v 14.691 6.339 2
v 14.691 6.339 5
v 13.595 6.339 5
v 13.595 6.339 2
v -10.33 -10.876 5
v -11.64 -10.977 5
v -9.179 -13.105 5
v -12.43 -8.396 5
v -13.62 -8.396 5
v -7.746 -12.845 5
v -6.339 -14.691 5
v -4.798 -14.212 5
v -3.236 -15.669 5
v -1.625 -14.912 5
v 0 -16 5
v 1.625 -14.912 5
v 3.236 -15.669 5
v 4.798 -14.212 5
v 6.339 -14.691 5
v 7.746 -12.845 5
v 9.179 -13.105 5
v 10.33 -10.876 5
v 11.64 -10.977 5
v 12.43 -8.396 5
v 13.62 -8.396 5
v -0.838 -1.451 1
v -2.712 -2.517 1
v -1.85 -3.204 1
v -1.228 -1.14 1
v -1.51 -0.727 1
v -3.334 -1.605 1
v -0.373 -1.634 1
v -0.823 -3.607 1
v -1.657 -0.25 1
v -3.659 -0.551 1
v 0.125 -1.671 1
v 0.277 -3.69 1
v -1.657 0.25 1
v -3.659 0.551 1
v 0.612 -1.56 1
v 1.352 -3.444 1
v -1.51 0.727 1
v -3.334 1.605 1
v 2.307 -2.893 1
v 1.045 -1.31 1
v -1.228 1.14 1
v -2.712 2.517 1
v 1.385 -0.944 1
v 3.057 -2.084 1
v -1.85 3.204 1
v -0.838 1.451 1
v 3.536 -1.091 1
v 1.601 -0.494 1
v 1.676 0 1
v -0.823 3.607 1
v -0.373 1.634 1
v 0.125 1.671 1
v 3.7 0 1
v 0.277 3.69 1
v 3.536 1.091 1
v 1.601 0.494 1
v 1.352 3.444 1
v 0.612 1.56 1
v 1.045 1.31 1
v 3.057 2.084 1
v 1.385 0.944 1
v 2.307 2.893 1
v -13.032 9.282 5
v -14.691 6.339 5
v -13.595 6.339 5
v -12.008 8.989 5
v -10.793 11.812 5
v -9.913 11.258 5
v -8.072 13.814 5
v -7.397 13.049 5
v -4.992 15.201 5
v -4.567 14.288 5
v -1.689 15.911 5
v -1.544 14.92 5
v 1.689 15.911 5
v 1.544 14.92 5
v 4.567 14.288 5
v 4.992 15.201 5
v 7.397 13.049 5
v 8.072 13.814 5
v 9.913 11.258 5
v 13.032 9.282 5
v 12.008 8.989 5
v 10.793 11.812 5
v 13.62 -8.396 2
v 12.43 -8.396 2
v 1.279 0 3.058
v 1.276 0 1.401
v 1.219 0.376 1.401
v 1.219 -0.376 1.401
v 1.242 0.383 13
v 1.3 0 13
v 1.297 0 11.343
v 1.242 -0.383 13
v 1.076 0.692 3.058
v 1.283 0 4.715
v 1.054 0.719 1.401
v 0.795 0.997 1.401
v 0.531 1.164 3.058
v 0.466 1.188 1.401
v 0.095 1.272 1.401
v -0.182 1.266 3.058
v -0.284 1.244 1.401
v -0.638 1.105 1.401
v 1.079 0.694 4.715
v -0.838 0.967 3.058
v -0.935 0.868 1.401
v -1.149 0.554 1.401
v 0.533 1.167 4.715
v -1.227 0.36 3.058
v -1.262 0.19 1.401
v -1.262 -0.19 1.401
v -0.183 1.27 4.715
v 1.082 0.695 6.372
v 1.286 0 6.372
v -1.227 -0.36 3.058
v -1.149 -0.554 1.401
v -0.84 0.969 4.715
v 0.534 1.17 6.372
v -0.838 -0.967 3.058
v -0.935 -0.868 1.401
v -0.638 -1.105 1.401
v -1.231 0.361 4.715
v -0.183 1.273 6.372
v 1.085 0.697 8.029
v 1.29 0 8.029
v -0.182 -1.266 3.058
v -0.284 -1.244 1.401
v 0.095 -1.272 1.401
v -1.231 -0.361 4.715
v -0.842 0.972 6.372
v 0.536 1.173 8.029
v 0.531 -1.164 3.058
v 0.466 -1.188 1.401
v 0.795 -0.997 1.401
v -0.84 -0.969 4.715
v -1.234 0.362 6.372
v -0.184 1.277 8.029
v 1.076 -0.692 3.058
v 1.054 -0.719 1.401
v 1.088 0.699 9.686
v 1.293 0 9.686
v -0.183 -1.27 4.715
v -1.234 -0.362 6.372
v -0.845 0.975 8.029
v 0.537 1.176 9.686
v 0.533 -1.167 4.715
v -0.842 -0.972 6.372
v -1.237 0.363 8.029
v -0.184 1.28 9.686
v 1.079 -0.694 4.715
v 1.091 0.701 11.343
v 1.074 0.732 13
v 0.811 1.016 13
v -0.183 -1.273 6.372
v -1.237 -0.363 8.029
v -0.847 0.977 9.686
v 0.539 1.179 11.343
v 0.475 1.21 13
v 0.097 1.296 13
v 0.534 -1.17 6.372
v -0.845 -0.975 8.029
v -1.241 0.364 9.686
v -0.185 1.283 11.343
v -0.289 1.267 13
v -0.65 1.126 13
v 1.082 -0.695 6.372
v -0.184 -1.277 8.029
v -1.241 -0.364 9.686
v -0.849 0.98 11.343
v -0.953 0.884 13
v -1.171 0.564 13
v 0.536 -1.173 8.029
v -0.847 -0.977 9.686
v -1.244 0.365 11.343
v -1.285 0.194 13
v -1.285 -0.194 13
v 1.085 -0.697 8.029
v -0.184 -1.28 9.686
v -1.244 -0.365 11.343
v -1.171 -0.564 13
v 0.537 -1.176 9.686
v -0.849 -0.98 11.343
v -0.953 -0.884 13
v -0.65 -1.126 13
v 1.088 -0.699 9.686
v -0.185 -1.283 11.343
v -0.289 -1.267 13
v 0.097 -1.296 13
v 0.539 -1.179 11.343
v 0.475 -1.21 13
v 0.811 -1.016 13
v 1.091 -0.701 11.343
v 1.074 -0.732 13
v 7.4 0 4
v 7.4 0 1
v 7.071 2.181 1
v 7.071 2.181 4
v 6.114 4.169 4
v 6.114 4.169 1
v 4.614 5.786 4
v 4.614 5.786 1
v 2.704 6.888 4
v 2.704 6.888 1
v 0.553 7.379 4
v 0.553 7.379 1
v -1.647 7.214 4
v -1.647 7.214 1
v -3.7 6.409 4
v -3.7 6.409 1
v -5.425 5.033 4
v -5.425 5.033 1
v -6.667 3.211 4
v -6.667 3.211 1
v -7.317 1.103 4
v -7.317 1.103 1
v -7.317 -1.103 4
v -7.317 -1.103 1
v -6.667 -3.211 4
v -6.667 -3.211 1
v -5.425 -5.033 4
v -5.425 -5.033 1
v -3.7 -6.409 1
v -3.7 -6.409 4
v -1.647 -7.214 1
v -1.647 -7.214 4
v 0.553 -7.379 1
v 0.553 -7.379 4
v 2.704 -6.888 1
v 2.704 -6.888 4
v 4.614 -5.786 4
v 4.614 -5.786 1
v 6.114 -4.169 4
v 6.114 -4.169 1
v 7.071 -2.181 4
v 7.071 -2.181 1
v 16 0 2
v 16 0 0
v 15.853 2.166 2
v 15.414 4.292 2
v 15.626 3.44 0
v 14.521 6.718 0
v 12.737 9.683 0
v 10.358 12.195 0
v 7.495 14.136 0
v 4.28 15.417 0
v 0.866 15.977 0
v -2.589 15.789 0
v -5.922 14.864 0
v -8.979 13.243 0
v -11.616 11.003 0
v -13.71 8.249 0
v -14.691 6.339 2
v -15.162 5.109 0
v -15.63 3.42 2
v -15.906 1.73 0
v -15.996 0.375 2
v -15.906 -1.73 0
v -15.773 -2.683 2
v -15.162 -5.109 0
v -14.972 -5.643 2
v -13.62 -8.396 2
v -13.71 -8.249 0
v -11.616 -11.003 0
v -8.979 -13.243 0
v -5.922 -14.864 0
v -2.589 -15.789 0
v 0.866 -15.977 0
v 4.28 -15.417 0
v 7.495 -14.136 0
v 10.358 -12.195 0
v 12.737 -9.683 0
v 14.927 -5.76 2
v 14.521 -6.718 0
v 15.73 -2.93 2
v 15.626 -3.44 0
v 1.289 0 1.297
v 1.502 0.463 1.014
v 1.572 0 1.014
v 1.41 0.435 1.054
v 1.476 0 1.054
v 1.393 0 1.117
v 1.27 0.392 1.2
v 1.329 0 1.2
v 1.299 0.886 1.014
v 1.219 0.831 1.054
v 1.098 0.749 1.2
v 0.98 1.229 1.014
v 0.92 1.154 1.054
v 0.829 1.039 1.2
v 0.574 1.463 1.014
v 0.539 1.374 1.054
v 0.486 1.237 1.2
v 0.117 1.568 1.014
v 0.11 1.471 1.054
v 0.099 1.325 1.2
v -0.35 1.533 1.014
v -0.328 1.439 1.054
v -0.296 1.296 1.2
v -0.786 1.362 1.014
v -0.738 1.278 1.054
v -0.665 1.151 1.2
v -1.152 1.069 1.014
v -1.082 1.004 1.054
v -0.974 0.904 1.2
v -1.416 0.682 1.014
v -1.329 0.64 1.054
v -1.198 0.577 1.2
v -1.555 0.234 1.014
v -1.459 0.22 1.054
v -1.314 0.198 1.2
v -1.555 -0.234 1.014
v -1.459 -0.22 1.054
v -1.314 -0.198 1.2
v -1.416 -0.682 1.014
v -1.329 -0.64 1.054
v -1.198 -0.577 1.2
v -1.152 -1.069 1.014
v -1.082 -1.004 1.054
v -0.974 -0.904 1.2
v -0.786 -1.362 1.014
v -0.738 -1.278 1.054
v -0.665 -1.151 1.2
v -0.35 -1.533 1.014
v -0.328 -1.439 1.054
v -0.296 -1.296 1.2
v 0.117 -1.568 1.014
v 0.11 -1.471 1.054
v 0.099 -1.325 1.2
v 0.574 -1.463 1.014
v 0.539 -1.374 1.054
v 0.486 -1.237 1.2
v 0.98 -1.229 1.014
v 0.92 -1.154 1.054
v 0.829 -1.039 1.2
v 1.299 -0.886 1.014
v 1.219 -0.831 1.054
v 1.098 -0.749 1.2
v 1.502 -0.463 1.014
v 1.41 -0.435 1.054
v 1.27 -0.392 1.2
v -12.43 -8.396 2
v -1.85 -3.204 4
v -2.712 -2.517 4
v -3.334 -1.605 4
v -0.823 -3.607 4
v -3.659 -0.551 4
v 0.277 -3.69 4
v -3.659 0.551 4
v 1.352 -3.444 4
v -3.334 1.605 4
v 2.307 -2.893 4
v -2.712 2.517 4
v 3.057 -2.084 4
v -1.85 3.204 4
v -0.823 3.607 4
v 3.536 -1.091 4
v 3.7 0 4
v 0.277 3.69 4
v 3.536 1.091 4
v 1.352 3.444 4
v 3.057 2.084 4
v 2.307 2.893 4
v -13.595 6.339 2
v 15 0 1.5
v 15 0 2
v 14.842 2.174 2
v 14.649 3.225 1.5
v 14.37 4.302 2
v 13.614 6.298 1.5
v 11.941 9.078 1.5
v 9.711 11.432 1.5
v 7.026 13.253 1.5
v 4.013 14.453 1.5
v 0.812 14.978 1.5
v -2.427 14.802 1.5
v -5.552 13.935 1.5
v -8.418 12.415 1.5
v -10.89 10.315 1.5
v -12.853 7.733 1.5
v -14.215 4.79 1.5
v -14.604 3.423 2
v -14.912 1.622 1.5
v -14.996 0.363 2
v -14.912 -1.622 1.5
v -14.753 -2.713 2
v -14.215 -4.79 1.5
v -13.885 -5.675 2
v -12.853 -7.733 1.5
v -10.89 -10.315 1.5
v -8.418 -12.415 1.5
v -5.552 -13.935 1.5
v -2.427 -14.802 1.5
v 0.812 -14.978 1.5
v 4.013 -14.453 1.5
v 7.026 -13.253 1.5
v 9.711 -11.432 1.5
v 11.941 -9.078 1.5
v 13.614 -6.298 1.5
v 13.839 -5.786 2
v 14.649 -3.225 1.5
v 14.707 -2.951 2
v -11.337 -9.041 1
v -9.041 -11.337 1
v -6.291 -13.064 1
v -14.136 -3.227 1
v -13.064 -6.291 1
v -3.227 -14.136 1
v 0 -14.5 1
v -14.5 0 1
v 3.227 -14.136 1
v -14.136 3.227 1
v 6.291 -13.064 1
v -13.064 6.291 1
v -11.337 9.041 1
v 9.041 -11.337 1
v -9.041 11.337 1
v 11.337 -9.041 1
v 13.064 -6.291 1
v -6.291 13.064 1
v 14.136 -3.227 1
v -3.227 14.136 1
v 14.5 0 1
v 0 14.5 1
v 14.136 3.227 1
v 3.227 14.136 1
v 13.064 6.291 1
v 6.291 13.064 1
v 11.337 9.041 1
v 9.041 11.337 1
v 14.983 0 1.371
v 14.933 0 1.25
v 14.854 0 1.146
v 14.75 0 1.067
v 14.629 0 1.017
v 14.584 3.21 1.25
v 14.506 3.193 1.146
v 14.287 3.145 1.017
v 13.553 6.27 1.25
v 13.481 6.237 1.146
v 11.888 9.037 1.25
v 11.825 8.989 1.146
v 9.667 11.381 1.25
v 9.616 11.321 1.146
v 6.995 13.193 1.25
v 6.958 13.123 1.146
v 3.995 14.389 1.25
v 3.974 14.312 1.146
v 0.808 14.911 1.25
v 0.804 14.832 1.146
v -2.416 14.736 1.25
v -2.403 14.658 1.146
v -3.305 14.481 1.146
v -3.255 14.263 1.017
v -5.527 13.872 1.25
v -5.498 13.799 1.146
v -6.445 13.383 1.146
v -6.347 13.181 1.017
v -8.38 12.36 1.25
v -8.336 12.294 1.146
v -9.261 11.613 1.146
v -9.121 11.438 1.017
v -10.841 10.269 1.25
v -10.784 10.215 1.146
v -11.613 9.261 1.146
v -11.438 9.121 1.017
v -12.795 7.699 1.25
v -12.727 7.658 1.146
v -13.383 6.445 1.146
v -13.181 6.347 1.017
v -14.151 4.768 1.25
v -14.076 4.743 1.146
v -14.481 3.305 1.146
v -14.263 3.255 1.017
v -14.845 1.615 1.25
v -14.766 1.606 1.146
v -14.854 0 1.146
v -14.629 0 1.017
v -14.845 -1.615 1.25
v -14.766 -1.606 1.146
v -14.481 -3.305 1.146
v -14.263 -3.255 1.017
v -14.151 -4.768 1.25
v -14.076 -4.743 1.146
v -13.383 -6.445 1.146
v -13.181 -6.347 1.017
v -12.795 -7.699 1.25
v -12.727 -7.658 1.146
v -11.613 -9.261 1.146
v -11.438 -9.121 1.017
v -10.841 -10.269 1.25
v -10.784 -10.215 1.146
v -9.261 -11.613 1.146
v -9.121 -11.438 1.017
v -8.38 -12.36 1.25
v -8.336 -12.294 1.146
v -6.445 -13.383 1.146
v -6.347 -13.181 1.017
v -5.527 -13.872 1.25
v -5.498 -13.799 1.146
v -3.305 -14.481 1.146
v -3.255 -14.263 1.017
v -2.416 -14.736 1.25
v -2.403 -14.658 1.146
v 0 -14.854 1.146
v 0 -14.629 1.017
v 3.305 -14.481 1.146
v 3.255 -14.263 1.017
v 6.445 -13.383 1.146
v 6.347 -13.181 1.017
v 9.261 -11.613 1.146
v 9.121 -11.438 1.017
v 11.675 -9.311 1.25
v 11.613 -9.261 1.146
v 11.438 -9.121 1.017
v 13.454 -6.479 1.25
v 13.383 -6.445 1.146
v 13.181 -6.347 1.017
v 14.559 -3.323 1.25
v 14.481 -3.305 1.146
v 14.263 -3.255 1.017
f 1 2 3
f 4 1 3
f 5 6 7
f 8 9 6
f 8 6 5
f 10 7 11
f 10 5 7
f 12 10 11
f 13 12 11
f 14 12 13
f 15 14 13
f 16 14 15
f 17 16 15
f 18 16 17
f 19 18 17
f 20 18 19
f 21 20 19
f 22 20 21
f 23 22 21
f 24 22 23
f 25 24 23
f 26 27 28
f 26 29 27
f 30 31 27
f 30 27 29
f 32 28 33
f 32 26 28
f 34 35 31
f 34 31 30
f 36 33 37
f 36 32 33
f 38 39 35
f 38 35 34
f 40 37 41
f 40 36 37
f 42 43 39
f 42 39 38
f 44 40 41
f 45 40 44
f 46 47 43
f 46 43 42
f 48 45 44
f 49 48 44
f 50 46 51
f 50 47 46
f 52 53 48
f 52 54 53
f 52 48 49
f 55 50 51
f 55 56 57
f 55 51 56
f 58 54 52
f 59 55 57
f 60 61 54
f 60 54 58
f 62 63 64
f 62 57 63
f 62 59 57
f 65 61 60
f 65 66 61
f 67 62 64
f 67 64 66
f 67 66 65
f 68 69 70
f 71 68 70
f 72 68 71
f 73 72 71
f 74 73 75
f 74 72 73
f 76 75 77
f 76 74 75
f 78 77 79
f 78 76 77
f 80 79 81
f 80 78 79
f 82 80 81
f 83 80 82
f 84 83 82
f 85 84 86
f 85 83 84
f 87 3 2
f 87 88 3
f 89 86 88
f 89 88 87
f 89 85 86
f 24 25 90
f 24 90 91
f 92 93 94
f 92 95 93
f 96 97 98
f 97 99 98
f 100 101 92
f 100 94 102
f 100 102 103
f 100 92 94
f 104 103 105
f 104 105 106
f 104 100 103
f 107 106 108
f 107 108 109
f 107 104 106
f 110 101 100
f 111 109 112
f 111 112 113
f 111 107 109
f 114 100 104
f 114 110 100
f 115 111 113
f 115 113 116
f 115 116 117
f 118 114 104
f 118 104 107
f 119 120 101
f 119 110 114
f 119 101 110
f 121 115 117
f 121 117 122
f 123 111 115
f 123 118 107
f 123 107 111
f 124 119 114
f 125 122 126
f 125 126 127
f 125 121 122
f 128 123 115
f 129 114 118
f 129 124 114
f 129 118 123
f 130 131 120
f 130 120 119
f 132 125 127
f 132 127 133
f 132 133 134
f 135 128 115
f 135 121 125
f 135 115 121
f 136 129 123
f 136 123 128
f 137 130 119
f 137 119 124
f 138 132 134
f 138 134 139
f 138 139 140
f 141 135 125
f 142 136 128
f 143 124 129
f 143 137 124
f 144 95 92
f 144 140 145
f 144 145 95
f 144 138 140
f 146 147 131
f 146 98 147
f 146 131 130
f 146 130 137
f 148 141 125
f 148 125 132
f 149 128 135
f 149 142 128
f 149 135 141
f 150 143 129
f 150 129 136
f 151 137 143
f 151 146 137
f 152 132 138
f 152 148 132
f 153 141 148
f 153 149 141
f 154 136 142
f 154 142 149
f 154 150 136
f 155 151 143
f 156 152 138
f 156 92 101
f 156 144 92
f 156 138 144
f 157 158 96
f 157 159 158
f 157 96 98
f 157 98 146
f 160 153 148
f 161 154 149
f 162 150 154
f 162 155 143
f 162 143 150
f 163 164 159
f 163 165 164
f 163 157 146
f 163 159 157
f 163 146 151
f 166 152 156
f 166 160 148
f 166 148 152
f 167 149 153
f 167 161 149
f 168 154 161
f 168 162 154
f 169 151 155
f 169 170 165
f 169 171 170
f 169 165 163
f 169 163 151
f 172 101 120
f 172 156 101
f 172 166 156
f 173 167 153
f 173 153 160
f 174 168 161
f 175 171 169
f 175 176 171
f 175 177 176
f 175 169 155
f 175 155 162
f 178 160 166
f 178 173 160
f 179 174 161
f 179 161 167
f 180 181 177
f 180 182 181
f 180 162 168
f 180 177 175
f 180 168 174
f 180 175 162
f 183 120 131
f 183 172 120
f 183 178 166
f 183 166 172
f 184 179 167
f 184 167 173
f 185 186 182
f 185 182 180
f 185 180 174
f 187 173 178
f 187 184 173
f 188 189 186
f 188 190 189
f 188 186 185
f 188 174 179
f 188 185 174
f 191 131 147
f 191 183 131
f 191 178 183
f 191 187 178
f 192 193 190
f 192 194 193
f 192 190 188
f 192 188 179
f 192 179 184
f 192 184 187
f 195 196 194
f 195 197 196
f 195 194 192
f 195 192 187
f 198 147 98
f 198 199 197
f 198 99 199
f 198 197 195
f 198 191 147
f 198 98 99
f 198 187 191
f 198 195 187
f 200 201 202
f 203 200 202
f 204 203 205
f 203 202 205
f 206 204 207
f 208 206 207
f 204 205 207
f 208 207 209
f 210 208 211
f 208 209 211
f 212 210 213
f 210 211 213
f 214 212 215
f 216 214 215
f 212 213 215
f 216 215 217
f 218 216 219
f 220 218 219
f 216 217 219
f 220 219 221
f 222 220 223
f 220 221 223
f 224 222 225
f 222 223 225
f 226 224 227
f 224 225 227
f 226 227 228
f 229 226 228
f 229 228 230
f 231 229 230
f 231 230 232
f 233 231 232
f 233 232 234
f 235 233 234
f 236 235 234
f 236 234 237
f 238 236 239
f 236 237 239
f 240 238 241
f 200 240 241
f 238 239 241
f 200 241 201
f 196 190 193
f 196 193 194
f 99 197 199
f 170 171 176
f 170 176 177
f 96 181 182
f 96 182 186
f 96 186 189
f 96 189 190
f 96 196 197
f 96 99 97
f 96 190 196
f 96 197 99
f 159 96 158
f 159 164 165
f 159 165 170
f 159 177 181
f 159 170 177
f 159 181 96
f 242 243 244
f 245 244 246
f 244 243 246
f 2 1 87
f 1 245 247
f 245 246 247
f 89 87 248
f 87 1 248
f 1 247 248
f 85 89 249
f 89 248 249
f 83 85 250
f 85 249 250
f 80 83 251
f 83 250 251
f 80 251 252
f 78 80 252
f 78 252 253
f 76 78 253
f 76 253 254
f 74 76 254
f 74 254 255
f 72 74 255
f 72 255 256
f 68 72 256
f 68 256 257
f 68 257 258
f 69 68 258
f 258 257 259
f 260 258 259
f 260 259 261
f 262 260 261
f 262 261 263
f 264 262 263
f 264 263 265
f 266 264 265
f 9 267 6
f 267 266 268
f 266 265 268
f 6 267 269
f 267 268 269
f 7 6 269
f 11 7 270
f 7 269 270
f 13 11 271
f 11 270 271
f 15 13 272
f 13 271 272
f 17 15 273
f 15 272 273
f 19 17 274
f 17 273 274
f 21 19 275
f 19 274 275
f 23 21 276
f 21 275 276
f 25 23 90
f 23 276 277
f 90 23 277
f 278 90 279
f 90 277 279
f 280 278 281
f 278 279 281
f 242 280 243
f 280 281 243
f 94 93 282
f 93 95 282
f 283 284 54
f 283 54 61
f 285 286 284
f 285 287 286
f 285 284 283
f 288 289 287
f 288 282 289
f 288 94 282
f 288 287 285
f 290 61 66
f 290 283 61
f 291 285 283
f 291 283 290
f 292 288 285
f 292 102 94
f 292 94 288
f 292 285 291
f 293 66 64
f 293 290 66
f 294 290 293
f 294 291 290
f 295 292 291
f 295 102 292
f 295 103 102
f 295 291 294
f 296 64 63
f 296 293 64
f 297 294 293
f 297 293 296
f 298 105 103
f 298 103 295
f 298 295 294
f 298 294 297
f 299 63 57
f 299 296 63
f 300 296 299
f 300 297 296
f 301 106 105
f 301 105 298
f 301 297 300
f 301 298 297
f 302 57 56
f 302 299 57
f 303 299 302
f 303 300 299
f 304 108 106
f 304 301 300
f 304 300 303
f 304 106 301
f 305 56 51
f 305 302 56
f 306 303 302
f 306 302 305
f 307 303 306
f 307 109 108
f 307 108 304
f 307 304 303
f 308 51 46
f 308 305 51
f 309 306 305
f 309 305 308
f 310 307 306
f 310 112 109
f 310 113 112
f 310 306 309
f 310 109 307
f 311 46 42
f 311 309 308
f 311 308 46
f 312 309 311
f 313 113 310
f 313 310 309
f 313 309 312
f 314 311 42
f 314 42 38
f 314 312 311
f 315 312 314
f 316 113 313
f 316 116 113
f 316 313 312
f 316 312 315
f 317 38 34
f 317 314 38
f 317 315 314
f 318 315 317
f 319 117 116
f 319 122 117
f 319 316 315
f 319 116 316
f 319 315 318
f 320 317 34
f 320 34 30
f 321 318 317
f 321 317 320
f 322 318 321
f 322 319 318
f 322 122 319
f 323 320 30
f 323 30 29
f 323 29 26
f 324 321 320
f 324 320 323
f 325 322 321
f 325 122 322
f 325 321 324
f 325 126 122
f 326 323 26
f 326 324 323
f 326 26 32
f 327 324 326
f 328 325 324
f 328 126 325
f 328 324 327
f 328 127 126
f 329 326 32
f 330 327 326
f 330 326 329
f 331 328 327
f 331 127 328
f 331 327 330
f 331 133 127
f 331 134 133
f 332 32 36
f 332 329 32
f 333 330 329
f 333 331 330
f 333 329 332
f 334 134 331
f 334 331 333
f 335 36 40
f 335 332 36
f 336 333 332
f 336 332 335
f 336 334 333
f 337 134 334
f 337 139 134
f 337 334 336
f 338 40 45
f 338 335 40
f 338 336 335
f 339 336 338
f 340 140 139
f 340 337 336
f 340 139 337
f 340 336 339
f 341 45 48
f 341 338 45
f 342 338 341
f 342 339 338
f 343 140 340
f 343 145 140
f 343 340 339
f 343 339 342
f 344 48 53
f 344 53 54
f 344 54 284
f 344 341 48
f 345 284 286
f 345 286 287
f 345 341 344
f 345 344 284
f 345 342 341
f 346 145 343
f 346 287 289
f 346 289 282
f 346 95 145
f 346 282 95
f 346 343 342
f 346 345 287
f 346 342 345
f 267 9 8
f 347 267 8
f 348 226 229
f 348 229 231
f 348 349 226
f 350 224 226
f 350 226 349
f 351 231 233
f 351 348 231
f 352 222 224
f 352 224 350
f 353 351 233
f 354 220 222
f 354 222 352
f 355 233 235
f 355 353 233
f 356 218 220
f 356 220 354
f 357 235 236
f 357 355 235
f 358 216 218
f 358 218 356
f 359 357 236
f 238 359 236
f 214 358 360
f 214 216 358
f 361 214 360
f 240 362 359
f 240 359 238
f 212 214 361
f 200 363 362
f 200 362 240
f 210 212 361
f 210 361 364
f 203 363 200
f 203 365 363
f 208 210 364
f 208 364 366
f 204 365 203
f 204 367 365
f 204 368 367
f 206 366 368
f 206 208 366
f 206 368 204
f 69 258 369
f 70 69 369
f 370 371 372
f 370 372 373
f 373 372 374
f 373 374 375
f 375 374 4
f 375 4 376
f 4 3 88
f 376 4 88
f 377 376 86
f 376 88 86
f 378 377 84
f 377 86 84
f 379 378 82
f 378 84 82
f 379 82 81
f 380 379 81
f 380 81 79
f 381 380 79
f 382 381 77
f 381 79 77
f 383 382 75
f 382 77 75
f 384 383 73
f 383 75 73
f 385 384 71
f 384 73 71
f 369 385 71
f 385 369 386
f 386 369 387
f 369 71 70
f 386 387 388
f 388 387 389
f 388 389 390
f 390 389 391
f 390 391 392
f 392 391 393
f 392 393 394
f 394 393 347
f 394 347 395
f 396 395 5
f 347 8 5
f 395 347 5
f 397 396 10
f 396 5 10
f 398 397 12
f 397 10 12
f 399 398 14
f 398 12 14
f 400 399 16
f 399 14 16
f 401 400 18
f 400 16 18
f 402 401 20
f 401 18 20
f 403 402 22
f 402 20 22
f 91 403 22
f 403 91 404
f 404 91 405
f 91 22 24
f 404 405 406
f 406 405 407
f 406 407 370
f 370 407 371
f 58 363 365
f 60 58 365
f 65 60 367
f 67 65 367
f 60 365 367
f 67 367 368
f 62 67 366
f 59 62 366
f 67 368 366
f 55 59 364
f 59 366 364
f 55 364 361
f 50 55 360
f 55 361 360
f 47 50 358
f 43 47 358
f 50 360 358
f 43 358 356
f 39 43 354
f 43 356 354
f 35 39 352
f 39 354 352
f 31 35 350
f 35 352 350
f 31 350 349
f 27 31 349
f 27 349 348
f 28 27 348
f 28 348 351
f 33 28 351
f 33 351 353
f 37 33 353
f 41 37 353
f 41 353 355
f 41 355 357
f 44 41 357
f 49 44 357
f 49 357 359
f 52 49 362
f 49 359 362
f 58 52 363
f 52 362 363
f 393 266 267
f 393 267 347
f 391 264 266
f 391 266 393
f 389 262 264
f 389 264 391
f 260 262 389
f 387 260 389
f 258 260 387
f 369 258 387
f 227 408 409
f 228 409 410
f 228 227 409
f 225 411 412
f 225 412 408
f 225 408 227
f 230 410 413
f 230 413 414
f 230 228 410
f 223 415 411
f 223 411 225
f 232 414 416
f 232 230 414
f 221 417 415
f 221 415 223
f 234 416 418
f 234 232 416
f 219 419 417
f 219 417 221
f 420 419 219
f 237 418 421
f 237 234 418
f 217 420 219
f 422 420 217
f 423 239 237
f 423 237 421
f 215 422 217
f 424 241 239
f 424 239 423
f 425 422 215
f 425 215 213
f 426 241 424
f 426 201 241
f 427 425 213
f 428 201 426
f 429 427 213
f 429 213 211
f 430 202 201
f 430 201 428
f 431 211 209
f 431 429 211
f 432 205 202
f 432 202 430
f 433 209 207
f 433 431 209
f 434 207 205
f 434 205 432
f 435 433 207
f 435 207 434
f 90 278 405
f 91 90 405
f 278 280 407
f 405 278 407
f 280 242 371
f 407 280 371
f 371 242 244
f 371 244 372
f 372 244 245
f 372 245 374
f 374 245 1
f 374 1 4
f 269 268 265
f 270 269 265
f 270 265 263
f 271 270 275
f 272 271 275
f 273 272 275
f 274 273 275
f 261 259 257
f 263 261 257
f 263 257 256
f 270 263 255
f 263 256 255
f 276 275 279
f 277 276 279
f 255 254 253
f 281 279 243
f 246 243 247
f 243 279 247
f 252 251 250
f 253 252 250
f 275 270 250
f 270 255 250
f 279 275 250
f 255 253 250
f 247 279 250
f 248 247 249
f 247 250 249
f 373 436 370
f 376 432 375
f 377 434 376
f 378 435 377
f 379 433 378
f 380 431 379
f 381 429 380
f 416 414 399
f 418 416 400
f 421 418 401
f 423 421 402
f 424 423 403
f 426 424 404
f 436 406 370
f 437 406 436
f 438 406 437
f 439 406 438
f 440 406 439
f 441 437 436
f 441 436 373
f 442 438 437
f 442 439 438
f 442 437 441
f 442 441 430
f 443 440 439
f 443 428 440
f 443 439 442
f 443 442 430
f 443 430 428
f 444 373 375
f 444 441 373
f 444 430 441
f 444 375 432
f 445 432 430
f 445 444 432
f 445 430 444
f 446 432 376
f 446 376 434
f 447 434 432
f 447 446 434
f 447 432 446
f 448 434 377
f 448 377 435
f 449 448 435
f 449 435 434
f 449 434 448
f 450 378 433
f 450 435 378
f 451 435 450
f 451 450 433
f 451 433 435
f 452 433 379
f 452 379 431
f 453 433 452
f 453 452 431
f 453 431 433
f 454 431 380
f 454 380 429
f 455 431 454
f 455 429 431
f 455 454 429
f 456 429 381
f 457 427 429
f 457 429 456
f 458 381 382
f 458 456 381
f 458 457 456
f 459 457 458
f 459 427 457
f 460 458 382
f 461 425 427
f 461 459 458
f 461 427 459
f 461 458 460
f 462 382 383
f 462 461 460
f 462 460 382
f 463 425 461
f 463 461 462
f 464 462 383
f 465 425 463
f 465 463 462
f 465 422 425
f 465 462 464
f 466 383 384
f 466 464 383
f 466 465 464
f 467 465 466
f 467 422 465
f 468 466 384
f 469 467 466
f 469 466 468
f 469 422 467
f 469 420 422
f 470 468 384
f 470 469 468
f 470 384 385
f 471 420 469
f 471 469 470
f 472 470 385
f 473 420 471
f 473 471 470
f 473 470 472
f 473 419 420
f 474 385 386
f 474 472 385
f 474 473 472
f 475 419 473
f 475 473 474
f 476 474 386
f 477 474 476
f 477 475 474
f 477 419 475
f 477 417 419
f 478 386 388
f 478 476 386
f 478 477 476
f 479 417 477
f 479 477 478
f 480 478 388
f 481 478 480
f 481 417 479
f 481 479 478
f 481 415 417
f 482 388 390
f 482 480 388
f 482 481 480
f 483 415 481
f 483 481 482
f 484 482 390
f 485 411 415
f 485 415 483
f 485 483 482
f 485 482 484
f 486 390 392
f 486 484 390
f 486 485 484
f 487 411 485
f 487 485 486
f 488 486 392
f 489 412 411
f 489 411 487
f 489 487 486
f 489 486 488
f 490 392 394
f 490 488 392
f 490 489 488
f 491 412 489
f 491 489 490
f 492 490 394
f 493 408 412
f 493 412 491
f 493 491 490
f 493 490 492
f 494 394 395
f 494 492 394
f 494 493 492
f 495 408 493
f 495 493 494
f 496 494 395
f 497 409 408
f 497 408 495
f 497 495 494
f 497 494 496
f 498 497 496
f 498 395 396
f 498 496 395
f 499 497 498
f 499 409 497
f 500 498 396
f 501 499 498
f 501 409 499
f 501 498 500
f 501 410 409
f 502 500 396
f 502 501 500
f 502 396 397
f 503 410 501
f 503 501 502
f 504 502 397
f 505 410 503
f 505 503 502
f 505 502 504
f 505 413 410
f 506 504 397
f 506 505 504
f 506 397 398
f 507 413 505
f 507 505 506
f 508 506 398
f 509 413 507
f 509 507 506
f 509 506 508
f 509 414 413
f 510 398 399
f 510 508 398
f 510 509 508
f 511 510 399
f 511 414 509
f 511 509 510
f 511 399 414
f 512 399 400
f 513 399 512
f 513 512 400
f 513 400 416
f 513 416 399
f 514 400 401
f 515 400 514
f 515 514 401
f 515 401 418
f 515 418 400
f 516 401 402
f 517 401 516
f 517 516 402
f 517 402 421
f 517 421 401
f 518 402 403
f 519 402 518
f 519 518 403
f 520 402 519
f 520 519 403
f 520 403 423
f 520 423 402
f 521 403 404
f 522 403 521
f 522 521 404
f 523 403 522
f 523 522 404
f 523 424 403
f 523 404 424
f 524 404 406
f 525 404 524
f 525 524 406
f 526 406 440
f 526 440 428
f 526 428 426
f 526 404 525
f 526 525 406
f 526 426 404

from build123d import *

# Parameters (mm, degrees)
SKETCH1_R           = 16
BOSS_EXTRUDE1_DEPTH = 5
SKETCH3_R           = 15
CUT_EXTRUDE1_DEPTH  = 4
FILLET1_R           = 0.5
SKETCH7_W           = 5.268501054
SKETCH7_H           = 14.735182388
CUT_EXTRUDE2_DEPTH  = 11
SKETCH8_R           = 7.4
BOSS_EXTRUDE2_DEPTH = 3
SKETCH9_R           = 3.7
CUT_EXTRUDE3_DEPTH  = 3
SKETCH5_R           = 1.275
SKETCH6_R           = 1.3
FILLET3_R           = 0.4


with BuildPart() as part:
    # Sketch1 → Boss-Extrude1 (new body)
    with BuildSketch(Plane.XY):
        Circle(SKETCH1_R)
    extrude(amount=BOSS_EXTRUDE1_DEPTH)

    # Sketch3 → Cut-Extrude1 (cut)
    with BuildSketch(Plane.XY.offset(5)):
        Circle(SKETCH3_R)
    extrude(amount=-CUT_EXTRUDE1_DEPTH, mode=Mode.SUBTRACT)

    # Fillet1
    fillet1_edges = [part.edges().sort_by_distance(p)[0] for p in [
        (-15, 0, 1),
    ]]
    fillet(fillet1_edges, radius=FILLET1_R)

    # Sketch7 → Cut-Extrude2 (cut)
    with BuildSketch(Plane.XY.offset(13)):
        with Locations((-14.456252894, -1.028256592)):
            Rectangle(SKETCH7_W, SKETCH7_H)
    cut_extrude2 = extrude(amount=-CUT_EXTRUDE2_DEPTH, mode=Mode.SUBTRACT)

    # Mirror1: Cut-Extrude2 across plane
    add(cut_extrude2.mirror(Plane(origin=(0, 0, 0), x_dir=(0, 0, 1), z_dir=(1, 0, 0))), mode=Mode.SUBTRACT)

    # Sketch8 → Boss-Extrude2 (add)
    with BuildSketch(Plane.XY.offset(1)):
        Circle(SKETCH8_R)
    extrude(amount=BOSS_EXTRUDE2_DEPTH)

    # Sketch9 → Cut-Extrude3 (cut)
    with BuildSketch(Plane.XY.offset(4)):
        Circle(SKETCH9_R)
    extrude(amount=-CUT_EXTRUDE3_DEPTH, mode=Mode.SUBTRACT)

    # Sketch5 → Loft1 section 0
    with BuildSketch(Plane.XY.offset(1)):
        Circle(SKETCH5_R)
    # Sketch6 → Loft1 section 1
    with BuildSketch(Plane.XY.offset(13)):
        Circle(SKETCH6_R)
    loft()

    # Fillet3
    fillet3_edges = [part.edges().sort_by_distance(p)[0] for p in [
        (-1.275, 0, 1),
    ]]
    fillet(fillet3_edges, radius=FILLET3_R)


solid = part.part
